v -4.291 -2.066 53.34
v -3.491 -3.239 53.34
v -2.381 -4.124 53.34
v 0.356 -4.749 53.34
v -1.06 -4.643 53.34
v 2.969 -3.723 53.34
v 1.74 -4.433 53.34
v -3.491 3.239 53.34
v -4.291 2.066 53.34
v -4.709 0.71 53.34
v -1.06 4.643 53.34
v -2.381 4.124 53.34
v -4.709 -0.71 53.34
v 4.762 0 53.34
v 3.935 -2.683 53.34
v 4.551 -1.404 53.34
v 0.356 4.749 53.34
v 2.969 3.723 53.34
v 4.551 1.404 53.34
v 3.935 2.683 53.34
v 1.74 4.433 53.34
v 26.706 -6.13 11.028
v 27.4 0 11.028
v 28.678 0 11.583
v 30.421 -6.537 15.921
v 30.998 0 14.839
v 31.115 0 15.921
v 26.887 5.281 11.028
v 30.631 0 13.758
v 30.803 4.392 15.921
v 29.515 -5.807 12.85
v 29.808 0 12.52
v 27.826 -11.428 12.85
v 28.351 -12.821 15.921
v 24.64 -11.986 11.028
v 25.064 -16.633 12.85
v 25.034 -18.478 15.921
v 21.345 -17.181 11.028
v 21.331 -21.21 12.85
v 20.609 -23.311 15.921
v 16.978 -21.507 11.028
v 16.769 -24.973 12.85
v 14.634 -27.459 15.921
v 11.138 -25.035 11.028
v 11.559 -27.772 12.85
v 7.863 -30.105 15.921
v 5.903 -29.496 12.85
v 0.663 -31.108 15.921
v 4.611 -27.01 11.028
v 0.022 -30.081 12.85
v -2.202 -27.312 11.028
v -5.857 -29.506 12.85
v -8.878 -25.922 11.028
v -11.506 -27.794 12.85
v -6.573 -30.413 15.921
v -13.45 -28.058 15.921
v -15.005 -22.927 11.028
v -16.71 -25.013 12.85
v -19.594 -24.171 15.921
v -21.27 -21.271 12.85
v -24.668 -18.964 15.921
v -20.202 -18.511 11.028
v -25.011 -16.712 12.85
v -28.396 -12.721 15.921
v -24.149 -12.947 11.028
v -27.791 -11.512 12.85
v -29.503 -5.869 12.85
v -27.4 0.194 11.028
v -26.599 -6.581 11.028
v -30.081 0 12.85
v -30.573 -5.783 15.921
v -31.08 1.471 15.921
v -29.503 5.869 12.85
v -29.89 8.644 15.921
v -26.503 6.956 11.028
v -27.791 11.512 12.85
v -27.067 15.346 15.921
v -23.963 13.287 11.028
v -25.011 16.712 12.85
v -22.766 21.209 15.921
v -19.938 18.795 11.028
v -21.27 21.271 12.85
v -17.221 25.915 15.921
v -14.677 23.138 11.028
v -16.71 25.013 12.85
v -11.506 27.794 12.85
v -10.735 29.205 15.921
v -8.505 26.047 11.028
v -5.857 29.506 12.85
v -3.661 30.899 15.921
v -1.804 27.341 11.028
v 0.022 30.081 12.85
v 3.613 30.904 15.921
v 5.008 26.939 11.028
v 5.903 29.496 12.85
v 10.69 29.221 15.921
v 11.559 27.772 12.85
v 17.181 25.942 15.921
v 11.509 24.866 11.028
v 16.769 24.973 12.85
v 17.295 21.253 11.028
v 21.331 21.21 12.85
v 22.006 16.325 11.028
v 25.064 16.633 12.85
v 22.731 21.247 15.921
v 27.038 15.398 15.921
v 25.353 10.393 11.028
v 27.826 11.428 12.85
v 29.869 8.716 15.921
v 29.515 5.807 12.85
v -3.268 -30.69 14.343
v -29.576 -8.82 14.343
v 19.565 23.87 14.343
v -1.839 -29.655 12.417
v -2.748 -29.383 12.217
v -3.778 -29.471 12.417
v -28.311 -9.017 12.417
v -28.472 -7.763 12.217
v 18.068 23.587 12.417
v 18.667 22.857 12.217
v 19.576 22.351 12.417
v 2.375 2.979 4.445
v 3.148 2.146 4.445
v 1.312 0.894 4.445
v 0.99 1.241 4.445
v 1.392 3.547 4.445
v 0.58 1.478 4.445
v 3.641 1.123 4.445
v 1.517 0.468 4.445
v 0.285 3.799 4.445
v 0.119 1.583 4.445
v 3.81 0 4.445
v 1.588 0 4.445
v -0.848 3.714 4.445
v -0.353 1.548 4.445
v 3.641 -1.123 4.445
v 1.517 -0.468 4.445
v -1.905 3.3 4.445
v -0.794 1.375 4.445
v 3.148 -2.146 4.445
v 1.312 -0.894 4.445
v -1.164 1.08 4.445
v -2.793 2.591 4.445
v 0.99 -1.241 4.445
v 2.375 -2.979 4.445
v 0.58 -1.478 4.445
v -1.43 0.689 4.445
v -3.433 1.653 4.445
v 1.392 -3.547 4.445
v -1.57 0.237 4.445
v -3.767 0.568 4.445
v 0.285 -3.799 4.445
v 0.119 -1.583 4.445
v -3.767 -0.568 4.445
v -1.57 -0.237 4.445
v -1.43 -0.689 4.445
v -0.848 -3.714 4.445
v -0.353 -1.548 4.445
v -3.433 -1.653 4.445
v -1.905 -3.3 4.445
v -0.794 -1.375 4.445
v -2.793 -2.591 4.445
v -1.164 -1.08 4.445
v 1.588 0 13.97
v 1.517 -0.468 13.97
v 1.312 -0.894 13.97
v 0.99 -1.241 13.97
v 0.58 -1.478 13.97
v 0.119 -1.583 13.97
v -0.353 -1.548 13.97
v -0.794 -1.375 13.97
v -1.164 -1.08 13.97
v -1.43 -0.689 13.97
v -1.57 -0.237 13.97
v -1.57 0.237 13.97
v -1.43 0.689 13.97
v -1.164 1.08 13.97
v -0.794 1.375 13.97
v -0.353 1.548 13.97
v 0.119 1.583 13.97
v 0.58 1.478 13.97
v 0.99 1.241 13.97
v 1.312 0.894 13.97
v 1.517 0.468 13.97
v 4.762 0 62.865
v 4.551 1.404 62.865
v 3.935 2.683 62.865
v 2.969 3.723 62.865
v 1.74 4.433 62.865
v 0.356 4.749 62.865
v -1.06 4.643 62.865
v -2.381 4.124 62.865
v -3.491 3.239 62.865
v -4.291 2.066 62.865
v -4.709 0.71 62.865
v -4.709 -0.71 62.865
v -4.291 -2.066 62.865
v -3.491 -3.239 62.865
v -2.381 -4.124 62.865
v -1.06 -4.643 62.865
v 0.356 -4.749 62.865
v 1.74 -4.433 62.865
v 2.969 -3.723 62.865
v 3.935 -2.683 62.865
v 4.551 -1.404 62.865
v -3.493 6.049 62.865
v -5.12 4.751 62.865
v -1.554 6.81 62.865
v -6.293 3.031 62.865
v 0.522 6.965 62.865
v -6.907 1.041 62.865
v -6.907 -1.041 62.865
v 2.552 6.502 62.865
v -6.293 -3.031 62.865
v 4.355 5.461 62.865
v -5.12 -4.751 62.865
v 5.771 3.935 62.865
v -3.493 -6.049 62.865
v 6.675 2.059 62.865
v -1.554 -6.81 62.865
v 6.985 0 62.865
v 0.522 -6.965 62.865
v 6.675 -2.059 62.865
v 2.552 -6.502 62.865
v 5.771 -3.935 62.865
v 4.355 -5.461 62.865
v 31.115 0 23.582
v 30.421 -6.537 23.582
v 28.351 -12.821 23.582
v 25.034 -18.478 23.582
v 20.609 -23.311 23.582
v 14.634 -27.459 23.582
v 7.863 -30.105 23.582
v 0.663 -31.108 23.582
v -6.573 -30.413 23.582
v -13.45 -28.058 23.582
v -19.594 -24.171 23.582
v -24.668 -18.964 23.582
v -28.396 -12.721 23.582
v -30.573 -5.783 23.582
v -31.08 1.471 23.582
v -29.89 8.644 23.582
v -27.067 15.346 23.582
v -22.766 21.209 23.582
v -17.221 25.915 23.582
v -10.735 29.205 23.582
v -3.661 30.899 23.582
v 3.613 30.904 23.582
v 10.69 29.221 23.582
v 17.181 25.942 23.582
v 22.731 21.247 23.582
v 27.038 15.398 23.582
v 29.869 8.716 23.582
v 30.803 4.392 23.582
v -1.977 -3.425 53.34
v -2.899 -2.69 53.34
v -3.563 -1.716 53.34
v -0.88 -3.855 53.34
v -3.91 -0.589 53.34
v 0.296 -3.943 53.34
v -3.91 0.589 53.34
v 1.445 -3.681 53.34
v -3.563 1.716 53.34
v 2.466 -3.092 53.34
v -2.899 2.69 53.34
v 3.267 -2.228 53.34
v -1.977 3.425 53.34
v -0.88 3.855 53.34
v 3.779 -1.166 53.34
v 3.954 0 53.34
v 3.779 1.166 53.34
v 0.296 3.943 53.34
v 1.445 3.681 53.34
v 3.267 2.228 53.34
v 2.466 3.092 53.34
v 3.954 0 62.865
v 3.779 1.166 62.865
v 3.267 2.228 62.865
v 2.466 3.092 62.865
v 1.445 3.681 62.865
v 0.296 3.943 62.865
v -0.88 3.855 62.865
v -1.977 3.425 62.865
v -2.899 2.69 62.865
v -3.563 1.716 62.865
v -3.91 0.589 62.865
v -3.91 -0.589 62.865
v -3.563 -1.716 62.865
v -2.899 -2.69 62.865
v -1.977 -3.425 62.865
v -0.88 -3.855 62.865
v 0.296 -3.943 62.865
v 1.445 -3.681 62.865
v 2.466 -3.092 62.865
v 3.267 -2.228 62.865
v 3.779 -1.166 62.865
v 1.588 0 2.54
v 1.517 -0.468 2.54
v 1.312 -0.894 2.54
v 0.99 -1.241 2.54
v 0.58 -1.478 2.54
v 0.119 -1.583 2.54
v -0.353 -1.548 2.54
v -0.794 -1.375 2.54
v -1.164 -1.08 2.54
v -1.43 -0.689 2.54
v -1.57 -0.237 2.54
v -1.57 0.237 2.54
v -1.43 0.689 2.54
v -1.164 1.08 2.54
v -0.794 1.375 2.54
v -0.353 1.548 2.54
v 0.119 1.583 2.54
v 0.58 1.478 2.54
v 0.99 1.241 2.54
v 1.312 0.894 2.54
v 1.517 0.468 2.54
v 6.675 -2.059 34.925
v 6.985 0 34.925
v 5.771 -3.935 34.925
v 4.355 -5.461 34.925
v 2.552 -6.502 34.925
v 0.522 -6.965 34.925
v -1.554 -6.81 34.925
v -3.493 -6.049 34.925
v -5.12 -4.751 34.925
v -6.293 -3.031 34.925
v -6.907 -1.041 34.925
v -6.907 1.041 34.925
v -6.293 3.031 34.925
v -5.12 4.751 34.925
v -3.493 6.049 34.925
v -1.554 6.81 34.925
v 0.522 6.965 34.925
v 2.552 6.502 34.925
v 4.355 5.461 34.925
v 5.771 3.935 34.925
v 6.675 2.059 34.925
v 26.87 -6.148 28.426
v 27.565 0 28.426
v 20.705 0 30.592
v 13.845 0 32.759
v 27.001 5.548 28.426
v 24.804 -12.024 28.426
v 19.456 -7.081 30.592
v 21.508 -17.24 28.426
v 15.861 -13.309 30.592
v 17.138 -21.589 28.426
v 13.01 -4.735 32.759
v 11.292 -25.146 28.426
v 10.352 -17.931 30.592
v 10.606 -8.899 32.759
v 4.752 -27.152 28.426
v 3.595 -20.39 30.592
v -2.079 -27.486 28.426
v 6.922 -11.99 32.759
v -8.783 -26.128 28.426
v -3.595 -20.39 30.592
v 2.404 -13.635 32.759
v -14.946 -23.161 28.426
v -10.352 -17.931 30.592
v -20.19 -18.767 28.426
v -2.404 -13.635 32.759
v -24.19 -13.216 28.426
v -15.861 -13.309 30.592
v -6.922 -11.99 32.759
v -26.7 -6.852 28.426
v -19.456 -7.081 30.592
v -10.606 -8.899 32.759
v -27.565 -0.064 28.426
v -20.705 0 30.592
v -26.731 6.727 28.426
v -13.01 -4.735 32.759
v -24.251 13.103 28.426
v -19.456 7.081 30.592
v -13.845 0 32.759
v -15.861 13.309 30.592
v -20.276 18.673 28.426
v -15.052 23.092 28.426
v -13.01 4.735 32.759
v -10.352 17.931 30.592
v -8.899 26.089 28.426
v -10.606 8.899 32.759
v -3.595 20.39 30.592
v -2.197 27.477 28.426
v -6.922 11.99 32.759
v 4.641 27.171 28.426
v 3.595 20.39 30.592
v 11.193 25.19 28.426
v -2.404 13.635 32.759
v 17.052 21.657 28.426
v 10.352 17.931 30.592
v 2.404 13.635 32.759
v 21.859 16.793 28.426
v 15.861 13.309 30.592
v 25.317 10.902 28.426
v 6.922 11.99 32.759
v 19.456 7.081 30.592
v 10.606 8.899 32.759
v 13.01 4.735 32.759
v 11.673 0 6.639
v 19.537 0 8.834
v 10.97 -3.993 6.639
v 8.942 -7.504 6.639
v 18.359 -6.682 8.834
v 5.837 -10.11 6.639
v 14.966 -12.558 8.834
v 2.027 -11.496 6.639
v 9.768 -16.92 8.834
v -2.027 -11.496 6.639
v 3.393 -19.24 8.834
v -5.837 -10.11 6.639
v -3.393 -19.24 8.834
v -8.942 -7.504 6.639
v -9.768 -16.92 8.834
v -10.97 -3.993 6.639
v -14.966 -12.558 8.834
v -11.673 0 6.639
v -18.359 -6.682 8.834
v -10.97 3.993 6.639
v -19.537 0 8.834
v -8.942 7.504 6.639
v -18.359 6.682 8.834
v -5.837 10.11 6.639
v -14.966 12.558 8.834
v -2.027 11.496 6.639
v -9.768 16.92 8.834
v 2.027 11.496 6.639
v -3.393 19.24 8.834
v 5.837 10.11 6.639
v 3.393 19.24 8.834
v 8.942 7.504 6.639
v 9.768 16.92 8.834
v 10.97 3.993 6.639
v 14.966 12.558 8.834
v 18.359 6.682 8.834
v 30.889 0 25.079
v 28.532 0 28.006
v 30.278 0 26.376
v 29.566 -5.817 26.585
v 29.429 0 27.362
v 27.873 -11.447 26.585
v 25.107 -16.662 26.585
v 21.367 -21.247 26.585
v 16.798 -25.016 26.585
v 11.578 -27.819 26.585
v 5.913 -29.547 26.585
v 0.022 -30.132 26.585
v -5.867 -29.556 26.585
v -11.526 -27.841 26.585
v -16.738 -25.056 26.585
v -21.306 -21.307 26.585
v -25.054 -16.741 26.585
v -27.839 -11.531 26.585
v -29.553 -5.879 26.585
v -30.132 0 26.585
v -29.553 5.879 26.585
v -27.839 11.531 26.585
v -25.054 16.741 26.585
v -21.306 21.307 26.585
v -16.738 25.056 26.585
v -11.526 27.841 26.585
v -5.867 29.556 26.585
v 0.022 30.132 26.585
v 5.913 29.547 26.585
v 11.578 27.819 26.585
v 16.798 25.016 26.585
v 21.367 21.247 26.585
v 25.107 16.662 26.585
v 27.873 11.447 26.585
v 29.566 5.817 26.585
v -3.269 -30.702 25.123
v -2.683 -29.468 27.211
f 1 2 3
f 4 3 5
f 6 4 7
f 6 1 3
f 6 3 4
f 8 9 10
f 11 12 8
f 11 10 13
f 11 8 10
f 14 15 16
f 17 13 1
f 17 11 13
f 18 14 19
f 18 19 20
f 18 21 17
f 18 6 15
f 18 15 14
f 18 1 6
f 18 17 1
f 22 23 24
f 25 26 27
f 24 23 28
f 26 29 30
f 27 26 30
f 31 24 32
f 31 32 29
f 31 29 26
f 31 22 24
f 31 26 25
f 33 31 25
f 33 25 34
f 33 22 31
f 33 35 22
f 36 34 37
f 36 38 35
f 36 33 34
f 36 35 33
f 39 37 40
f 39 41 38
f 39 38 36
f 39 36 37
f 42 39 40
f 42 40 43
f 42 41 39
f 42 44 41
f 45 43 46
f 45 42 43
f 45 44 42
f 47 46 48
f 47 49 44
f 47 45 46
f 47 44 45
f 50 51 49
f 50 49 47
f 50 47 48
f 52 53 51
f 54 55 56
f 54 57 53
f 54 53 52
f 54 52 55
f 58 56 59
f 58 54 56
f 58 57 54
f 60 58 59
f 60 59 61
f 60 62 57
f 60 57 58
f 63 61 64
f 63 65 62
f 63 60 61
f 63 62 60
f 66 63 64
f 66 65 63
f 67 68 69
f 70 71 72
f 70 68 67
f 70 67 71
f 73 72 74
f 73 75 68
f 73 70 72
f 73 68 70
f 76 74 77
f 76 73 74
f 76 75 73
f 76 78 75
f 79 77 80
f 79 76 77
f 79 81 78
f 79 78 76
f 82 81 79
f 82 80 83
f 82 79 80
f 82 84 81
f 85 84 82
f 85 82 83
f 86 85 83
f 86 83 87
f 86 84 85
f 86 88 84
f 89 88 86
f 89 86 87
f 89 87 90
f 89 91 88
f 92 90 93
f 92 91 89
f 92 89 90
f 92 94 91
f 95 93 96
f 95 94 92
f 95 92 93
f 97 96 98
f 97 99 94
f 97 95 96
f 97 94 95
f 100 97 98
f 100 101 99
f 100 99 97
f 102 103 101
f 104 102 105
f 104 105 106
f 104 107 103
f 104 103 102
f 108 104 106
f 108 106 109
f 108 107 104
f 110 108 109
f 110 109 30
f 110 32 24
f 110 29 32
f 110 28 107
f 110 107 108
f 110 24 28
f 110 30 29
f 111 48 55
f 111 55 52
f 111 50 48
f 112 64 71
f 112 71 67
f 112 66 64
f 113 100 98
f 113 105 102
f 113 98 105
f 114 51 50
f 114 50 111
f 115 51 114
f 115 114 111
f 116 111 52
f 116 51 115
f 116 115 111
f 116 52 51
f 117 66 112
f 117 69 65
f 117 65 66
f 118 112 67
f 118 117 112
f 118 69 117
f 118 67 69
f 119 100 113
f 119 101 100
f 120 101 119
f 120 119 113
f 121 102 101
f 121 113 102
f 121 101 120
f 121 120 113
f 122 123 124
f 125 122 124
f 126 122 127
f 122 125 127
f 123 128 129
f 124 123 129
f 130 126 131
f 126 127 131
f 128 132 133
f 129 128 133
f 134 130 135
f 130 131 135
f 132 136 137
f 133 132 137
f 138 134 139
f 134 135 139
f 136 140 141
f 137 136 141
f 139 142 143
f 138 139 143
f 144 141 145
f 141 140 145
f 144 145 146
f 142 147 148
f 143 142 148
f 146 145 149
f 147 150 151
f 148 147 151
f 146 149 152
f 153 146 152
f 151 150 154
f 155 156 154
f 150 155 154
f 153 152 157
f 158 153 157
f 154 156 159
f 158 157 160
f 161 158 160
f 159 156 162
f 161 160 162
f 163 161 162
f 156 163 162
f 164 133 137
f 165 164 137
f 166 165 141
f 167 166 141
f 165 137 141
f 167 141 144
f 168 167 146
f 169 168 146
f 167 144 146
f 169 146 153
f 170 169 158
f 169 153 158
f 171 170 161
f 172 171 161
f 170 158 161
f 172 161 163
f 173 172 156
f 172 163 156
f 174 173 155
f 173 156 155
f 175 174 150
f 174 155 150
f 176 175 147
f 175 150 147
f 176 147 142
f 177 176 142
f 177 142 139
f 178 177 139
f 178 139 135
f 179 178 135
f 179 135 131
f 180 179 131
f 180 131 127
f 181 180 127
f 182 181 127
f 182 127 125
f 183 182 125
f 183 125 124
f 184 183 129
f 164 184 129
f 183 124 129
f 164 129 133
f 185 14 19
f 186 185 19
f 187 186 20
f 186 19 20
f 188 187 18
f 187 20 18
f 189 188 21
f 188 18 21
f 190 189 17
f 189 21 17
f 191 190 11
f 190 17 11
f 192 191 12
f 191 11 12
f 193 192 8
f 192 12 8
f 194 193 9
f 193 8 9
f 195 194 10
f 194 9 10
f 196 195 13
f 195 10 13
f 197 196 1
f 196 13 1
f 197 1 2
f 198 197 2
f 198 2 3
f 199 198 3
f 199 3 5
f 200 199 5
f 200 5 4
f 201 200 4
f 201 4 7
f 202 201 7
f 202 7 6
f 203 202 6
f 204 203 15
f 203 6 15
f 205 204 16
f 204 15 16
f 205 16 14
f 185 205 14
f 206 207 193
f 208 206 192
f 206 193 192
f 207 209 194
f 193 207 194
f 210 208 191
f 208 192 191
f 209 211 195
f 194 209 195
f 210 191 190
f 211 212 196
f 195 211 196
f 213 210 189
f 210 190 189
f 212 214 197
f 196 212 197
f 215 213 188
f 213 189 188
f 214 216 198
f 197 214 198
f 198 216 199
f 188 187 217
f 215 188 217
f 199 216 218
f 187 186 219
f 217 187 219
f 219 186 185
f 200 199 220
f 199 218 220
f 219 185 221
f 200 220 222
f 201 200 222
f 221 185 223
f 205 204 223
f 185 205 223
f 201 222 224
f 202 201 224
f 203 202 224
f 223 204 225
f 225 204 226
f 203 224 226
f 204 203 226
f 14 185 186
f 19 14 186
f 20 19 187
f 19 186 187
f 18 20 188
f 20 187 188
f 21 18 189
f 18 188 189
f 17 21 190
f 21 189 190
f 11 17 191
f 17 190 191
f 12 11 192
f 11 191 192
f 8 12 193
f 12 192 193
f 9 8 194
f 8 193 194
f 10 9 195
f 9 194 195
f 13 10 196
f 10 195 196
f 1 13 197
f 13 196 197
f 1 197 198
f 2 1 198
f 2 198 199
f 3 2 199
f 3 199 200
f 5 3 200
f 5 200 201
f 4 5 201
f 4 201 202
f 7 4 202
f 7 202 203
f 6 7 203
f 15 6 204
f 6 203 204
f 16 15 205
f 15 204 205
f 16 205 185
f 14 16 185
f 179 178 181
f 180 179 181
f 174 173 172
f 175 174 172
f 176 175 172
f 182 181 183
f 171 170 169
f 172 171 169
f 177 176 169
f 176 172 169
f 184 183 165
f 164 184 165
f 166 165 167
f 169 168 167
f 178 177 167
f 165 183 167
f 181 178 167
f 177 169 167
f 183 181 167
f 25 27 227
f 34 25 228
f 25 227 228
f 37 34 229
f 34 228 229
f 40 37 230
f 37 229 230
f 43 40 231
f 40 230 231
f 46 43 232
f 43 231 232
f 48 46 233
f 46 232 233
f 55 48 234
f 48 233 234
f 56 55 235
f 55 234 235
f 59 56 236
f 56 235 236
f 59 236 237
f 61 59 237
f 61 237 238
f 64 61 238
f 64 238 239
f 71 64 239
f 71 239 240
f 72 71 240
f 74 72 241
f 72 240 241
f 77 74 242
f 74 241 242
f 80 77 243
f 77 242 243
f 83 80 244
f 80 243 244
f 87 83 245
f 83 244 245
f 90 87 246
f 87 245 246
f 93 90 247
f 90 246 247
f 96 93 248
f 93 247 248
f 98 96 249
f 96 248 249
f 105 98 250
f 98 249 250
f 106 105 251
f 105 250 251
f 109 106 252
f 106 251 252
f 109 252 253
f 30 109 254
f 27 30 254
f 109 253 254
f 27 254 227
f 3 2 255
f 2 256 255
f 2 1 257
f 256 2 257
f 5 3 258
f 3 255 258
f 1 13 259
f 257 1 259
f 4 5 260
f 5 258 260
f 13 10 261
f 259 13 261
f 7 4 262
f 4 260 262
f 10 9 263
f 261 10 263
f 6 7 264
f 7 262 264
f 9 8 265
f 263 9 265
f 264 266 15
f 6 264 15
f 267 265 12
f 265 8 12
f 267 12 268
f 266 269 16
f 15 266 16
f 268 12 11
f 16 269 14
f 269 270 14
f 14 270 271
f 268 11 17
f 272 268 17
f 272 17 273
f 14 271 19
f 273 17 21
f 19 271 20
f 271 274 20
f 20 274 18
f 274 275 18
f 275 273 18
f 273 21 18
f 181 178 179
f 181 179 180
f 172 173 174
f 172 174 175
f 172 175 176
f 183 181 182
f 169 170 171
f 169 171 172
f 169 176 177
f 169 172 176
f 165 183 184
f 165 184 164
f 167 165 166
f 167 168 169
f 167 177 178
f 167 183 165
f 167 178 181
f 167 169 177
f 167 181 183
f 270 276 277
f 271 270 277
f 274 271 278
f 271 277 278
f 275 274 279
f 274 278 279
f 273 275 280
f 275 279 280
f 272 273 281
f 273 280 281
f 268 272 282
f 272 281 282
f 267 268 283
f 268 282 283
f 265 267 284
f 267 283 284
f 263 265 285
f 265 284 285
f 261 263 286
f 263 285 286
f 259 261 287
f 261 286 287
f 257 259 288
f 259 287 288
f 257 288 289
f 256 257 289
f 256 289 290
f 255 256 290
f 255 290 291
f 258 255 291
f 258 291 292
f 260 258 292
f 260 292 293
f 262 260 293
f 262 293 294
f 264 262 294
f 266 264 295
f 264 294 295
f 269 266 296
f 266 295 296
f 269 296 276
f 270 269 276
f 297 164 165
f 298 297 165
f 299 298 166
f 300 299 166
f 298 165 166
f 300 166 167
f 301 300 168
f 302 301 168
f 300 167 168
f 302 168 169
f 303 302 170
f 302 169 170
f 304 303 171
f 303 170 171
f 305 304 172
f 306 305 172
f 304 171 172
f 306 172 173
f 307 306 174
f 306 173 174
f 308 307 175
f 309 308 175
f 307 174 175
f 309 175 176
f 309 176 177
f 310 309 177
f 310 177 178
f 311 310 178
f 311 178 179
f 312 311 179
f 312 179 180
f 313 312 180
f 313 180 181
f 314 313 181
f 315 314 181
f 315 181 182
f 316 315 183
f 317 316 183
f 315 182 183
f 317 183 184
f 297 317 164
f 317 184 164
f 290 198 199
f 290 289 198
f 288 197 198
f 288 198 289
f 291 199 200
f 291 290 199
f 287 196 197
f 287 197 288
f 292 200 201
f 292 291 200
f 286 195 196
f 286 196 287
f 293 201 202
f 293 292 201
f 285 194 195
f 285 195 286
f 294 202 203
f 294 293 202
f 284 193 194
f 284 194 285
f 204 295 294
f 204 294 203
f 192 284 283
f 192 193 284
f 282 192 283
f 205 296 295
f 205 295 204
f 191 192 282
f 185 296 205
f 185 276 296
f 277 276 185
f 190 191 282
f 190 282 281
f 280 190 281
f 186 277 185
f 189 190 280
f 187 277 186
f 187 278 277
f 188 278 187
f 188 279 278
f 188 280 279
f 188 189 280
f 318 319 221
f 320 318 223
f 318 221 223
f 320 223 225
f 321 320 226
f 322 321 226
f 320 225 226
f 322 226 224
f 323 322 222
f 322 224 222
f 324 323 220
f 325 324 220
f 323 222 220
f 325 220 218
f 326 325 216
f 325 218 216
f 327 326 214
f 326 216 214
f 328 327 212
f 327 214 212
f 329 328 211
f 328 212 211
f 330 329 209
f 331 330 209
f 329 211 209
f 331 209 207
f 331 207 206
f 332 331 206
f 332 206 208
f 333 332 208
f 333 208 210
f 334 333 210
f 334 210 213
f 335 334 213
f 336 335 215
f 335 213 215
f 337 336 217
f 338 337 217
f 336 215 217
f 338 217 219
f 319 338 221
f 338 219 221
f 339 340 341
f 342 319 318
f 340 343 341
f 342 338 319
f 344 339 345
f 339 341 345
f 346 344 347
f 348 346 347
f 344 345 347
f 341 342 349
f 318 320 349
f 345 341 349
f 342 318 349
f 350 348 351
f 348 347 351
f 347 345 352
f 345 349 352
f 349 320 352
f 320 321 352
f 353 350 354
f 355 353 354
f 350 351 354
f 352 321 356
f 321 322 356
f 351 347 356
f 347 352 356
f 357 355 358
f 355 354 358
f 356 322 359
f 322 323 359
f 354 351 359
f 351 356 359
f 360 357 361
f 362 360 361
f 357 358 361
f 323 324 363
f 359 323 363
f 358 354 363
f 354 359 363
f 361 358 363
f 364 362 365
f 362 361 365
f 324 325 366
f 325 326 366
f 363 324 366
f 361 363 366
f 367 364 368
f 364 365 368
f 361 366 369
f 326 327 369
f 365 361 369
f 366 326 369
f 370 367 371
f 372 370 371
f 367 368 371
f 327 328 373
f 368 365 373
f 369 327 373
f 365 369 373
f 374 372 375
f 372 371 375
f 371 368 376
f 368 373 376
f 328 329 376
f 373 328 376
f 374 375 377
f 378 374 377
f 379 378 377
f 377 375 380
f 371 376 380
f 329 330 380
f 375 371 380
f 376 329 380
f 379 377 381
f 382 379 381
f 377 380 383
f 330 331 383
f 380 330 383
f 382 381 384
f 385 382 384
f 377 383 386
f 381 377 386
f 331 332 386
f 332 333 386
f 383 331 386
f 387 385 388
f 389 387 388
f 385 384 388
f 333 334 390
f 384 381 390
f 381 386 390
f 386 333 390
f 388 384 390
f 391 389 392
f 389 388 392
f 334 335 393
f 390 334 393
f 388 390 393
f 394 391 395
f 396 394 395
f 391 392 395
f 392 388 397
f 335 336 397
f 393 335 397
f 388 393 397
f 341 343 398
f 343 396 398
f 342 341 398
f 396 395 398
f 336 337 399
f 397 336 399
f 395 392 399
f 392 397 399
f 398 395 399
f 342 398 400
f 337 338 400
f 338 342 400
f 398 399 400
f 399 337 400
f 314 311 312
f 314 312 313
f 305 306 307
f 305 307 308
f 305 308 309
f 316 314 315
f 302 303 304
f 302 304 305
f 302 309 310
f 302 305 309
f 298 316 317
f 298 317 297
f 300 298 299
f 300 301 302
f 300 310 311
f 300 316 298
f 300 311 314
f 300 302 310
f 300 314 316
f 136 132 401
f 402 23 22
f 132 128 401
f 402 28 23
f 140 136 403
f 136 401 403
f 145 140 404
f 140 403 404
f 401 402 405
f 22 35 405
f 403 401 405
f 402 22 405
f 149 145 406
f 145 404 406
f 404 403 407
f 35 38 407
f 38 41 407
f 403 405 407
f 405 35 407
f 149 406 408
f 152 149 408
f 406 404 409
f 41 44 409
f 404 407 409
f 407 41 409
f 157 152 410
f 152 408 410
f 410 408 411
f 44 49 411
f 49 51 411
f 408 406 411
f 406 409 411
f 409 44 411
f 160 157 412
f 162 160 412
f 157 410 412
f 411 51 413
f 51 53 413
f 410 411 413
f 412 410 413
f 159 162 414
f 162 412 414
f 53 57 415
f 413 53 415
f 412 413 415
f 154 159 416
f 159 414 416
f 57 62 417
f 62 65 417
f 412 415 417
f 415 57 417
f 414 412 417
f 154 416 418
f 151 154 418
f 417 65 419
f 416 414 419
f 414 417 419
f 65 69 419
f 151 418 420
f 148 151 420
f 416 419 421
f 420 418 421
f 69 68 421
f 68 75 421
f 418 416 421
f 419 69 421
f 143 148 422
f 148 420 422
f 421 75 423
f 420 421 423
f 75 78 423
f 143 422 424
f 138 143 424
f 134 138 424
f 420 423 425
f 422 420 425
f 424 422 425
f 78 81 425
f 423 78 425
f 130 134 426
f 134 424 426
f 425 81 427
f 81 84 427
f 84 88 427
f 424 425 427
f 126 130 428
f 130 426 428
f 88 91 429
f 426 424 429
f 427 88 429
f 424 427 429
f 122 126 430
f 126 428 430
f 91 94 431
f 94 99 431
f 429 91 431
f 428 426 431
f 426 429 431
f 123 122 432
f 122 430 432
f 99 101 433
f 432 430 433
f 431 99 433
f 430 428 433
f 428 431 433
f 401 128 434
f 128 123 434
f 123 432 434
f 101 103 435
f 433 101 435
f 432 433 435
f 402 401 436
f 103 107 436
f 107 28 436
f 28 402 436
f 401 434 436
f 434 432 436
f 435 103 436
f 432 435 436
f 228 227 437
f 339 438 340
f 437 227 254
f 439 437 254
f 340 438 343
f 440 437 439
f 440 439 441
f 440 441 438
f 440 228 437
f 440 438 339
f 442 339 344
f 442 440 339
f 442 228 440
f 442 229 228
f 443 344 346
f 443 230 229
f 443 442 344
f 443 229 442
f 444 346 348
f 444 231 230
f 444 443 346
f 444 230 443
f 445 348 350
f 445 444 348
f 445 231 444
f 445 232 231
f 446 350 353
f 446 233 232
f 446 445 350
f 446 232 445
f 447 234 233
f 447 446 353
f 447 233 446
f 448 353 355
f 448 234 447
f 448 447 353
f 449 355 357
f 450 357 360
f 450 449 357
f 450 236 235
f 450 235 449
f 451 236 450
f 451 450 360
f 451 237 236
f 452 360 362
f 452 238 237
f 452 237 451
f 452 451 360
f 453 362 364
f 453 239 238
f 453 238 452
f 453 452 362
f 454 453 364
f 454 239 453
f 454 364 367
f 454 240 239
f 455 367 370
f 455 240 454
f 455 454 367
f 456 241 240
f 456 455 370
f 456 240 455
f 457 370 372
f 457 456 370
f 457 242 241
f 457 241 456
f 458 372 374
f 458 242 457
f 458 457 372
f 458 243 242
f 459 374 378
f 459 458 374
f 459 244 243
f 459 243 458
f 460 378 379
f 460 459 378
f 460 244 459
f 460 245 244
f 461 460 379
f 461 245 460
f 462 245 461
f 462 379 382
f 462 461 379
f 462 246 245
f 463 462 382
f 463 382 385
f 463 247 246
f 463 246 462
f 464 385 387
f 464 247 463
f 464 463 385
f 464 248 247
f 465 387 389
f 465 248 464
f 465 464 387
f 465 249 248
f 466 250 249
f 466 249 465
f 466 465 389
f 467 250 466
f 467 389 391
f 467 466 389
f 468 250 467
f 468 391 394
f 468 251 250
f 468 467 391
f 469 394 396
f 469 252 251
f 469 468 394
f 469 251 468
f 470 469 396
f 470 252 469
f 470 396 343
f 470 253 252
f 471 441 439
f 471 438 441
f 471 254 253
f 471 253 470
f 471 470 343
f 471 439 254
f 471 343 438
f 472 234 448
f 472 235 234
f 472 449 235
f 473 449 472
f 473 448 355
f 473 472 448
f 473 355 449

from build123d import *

# Parameters (mm, degrees)
F2_R      = 4.7625
F3_DEPTH  = 9.525
F4_R      = 1.5875
F5_DEPTH  = 9.525
F3_FACE_R = 4.7625
F6_DEPTH  = 9.525
F7_R      = 3.954416
F8_DEPTH  = 9.525
F5_FACE_R = 1.5875
F9_DEPTH  = 11.43
F10_R     = 5.08


with BuildPart() as f1:
    # F0 (on Front) → F1 (revolve)
    with BuildSketch(Plane.XZ):
        Polygon((3.81, 4.445), (31.115, 12.065), (31.115, 27.305), (6.985, 34.925), (6.985, 62.865), (0, 62.865), (0, 4.445), align=None)
    revolve(axis=Axis((0, 0, 33.655), (0, 0, -1)))

    # F2 (on face) → F3 (cut)
    with BuildSketch(Plane.XY.offset(62.865)):
        Circle(F2_R)
    extrude(amount=-F3_DEPTH, mode=Mode.SUBTRACT)

    # F4 (on face) → F5 (cut)
    with BuildSketch(Plane(origin=(0, 0, 4.445), x_dir=(1, 0, 0), z_dir=(0, 0, -1))):
        Circle(F4_R)
    extrude(amount=-F5_DEPTH, mode=Mode.SUBTRACT)

    # F10
    f10_edges = [f1.edges().sort_by_distance(p)[0] for p in [
        (-31.115, 0, 12.065),
        (-31.115, 0, 27.305),
        (31.115, 0, 19.685),
    ]]
    fillet(f10_edges, radius=F10_R)


with BuildPart() as f6:
    # F3_face (on face) → F6 (new body)
    with BuildSketch(Plane.XY.offset(53.34)):
        Circle(F3_FACE_R)
    extrude(amount=F6_DEPTH)

    # F7 (on face) → F8 (cut)
    with BuildSketch(Plane.XY.offset(62.865)):
        Circle(F7_R)
    extrude(amount=-F8_DEPTH, mode=Mode.SUBTRACT)


with BuildPart() as f9:
    # F5_face (on face) → F9 (new body)
    with BuildSketch(Plane(origin=(0, 0, 13.97), x_dir=(1, 0, 0), z_dir=(0, 0, -1))):
        Circle(F5_FACE_R)
    extrude(amount=F9_DEPTH)


solid = Compound([f1.part, f6.part, f9.part])
